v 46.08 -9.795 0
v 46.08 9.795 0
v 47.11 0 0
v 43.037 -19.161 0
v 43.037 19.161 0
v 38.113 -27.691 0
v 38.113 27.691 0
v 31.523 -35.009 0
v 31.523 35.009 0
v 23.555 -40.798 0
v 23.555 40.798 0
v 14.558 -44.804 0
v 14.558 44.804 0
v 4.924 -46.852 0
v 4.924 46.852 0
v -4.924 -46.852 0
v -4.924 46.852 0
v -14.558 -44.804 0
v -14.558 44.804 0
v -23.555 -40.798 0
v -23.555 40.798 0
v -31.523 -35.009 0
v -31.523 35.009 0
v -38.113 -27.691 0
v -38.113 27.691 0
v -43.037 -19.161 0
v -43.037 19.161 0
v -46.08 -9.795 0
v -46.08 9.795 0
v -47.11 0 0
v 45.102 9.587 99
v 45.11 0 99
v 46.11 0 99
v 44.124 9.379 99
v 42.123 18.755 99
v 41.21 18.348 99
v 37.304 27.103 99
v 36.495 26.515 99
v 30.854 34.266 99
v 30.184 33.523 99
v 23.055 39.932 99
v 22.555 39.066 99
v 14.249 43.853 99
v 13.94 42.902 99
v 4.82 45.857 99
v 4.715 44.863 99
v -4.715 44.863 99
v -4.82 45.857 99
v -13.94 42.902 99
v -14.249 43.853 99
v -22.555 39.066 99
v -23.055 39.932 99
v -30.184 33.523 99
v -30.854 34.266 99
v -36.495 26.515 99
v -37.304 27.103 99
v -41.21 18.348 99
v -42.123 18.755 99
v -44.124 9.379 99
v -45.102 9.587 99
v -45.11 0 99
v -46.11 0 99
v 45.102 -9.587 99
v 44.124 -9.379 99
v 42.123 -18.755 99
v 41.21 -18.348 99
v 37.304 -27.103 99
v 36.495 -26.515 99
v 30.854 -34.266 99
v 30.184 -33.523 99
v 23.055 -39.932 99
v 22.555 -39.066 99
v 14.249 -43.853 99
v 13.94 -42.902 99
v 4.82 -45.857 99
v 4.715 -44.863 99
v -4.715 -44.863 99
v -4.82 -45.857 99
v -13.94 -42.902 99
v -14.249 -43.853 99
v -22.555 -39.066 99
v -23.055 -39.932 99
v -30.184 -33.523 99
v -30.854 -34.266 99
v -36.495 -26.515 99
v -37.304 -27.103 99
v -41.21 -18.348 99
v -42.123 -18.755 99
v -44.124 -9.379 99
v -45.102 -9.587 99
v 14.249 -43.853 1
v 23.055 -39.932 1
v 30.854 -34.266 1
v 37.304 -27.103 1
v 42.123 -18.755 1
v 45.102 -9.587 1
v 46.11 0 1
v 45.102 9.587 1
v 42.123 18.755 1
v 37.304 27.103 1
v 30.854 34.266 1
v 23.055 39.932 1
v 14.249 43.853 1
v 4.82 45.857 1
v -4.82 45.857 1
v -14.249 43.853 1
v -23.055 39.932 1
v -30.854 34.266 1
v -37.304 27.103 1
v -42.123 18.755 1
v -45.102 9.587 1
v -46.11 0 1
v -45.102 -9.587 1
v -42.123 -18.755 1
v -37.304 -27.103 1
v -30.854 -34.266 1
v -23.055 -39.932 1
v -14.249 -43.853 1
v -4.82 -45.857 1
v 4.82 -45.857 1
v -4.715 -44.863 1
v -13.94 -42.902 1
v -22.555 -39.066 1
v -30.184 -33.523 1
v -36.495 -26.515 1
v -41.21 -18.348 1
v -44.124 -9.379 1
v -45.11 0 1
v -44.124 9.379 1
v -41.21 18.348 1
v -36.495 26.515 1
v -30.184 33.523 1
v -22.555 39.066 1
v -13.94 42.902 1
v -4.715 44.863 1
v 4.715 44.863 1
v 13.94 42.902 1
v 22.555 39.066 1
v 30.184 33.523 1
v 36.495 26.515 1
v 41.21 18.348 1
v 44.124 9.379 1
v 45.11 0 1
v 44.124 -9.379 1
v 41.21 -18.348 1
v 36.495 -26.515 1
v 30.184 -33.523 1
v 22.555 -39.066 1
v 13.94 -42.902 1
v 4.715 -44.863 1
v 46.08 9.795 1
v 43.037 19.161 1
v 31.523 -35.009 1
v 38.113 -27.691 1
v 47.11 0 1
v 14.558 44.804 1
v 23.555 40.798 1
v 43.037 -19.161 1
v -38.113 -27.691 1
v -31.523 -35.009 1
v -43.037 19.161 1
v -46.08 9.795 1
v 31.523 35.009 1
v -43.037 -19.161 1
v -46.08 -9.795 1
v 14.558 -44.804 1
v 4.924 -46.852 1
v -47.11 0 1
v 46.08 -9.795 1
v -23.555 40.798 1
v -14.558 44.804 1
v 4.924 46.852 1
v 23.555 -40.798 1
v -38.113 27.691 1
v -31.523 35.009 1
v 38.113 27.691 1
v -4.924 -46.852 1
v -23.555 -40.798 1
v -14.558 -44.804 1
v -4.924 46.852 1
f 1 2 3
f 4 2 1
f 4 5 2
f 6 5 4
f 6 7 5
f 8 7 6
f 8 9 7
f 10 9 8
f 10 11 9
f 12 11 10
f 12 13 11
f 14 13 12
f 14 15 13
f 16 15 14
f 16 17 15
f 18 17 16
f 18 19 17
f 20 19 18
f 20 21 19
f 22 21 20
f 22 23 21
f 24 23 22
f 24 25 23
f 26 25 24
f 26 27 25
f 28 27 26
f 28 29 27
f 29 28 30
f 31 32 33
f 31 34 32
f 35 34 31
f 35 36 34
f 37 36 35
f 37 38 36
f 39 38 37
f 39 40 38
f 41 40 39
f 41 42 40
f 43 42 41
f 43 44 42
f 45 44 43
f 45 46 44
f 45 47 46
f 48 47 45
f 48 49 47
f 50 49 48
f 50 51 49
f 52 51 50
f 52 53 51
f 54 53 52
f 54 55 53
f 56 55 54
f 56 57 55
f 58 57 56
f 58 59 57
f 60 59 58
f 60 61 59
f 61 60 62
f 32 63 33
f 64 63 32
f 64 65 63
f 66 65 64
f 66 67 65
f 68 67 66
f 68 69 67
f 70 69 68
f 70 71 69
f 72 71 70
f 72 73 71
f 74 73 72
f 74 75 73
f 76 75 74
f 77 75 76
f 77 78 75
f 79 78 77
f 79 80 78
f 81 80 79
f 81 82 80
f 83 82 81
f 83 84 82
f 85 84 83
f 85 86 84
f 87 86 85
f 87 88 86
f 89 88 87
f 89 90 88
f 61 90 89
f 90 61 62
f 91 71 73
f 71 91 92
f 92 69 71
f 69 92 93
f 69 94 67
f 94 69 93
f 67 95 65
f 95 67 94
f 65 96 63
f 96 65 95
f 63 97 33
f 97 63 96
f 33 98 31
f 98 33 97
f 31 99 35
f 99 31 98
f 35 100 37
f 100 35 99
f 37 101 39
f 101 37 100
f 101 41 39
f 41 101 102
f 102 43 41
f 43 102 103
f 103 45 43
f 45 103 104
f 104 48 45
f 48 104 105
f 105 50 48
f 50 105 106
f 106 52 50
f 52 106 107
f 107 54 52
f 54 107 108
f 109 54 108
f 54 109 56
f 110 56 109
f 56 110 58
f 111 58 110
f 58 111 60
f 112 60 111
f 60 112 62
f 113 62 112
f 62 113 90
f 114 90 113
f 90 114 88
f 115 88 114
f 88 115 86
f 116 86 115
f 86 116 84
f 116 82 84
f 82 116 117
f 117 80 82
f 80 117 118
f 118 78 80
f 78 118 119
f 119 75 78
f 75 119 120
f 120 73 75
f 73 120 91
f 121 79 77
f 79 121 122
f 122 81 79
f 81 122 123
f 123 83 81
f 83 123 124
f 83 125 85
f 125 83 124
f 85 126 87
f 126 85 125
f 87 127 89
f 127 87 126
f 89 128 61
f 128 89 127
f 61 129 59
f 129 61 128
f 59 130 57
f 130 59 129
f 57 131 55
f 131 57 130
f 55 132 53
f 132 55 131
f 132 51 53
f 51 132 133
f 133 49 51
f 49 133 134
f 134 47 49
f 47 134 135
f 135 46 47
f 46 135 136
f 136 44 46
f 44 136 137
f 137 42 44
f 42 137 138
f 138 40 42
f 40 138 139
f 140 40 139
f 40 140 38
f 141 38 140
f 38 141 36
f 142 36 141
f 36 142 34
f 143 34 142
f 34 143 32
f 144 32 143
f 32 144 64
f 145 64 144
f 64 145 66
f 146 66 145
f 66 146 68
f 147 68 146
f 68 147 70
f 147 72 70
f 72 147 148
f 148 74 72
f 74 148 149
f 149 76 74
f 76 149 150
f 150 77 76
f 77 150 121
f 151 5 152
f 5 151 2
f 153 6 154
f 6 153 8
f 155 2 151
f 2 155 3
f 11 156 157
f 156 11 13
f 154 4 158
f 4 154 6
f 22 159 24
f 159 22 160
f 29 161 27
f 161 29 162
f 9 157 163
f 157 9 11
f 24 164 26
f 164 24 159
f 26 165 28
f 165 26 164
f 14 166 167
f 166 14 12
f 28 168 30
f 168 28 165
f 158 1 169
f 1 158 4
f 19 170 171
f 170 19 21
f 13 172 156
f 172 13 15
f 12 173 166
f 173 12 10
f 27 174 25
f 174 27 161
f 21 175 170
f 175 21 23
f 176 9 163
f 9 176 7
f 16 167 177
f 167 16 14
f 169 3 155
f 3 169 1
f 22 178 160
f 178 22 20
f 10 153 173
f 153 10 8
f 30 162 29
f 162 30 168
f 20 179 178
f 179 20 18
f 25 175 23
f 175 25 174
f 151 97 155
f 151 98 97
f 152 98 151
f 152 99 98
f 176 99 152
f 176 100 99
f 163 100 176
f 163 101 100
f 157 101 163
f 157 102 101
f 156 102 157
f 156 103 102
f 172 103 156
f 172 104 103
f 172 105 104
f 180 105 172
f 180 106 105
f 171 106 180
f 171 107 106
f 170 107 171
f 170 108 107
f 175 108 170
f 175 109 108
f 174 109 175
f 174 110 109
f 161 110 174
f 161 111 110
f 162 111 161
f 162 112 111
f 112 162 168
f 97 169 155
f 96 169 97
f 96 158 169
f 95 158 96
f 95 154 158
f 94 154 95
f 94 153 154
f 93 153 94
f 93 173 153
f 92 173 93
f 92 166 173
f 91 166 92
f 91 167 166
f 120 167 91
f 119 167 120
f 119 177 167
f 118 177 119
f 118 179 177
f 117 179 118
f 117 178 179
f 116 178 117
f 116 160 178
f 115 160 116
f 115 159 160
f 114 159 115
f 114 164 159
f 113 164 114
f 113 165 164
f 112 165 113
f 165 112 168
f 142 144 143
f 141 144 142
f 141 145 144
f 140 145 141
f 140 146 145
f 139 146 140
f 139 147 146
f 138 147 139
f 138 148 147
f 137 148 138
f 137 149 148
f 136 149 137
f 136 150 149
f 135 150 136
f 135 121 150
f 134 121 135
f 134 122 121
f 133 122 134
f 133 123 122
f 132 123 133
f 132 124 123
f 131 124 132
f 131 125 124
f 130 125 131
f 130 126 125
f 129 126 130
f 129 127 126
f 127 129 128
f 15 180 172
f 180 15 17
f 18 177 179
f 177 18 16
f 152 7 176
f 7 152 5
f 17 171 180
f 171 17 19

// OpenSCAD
filename1 = ""; // [image_surface:100x100]
filename2 = ""; // [image_surface:100x100]
filename3 = ""; // [image_surface:100x100]
thickness = 2;
fn = 24;

// Create a triangle which is 1/fn of a circle. 
// Parameters:
//     r  - the circle radius 
//     fn - the same meaning as the $fn of OpenSCAD
module one_over_fn_for_circle(r, fn) {
    a = 360 / fn;
	x = r * cos(a / 2);
	y = r * sin(a / 2);
	polygon(points=[[0, 0], [x, y],[x, -y]]);
}

// Transform a model inito a cylinder.
// Parameters:
//     length - the model's length 
//     width  - the model's width
//     square_thickness - the model's thickness
//     fn - the same meaning as the $fn of OpenSCAD
module square_to_cylinder(length, width, square_thickness, fn) {
    r = length / 6.28318;
    a = 360 / fn;
	y = r * sin(a / 2);
	for(i = [0 : fn - 1]) {
	    rotate(a * i) translate([0, -(2 * y * i + y), 0]) intersection() {
		    translate([0, 2 * y * i + y, 0]) 
		        linear_extrude(width) 
				    one_over_fn_for_circle(r, fn);
			translate([r - square_thickness, 0, width]) 
	            rotate([0, 90, 0]) 
	                children(0);
		}
	}
}

// read Heightmap information from a png file.
// Parameters:
//     filename - a png filename
//     width  - the png's width
//     length  - the png's length
//     thickness - the height of the model
module from_png(filename, length, width, thickness) {
	translate([width - 1, 0, 0]) rotate(90) 
		scale([1, 1, 0.01 * thickness]) surface(filename); 
}

module blank_pen_holder(length, width, thickness) {
	color("black") linear_extrude(width) difference() {
		circle(length / 6.28318 - thickness / 2);
		circle(length / 6.28318 - thickness);
	}
	color("white") linear_extrude(thickness / 2) circle(length / 6.28318);
}

module png_to_pen_holder(filename, length, width, thickness) {
	blank_pen_holder(length - 1, width - 1, thickness);
	color("white") 
	    square_to_cylinder(length - 1, width - 1, thickness, fn)    
		    from_png(filename, length, width, thickness);
}

// specific for thingiverse customizer
module from_100x100_pngs(filenames, thickness) {
	translate([99, 0, 0]) rotate(90) { 
	    surface(filenames[0]); 
		translate([99, 0, 0]) surface(filenames[1]); 
		translate([198, 0, 0]) surface(filenames[2]); 
	}
}

// specific for thingiverse customizer
module 100x100_pngs_to_pen_holder(filenames, thickness) {
	blank_pen_holder(300 - 4, 100 - 1, thickness);
	color("white") 
	    square_to_cylinder(300 - 3, 100 - 1, thickness, fn)    
		    from_100x100_pngs(filenames, thickness);
}

// specific for thingiverse customizer
100x100_pngs_to_pen_holder([filename1, filename2, filename3], thickness);

/*

 if you use openscad directly, you may use the following code.
filename = "circuit.png";
png_to_pen_holder(filename, 300, 125, thickness);

*/
